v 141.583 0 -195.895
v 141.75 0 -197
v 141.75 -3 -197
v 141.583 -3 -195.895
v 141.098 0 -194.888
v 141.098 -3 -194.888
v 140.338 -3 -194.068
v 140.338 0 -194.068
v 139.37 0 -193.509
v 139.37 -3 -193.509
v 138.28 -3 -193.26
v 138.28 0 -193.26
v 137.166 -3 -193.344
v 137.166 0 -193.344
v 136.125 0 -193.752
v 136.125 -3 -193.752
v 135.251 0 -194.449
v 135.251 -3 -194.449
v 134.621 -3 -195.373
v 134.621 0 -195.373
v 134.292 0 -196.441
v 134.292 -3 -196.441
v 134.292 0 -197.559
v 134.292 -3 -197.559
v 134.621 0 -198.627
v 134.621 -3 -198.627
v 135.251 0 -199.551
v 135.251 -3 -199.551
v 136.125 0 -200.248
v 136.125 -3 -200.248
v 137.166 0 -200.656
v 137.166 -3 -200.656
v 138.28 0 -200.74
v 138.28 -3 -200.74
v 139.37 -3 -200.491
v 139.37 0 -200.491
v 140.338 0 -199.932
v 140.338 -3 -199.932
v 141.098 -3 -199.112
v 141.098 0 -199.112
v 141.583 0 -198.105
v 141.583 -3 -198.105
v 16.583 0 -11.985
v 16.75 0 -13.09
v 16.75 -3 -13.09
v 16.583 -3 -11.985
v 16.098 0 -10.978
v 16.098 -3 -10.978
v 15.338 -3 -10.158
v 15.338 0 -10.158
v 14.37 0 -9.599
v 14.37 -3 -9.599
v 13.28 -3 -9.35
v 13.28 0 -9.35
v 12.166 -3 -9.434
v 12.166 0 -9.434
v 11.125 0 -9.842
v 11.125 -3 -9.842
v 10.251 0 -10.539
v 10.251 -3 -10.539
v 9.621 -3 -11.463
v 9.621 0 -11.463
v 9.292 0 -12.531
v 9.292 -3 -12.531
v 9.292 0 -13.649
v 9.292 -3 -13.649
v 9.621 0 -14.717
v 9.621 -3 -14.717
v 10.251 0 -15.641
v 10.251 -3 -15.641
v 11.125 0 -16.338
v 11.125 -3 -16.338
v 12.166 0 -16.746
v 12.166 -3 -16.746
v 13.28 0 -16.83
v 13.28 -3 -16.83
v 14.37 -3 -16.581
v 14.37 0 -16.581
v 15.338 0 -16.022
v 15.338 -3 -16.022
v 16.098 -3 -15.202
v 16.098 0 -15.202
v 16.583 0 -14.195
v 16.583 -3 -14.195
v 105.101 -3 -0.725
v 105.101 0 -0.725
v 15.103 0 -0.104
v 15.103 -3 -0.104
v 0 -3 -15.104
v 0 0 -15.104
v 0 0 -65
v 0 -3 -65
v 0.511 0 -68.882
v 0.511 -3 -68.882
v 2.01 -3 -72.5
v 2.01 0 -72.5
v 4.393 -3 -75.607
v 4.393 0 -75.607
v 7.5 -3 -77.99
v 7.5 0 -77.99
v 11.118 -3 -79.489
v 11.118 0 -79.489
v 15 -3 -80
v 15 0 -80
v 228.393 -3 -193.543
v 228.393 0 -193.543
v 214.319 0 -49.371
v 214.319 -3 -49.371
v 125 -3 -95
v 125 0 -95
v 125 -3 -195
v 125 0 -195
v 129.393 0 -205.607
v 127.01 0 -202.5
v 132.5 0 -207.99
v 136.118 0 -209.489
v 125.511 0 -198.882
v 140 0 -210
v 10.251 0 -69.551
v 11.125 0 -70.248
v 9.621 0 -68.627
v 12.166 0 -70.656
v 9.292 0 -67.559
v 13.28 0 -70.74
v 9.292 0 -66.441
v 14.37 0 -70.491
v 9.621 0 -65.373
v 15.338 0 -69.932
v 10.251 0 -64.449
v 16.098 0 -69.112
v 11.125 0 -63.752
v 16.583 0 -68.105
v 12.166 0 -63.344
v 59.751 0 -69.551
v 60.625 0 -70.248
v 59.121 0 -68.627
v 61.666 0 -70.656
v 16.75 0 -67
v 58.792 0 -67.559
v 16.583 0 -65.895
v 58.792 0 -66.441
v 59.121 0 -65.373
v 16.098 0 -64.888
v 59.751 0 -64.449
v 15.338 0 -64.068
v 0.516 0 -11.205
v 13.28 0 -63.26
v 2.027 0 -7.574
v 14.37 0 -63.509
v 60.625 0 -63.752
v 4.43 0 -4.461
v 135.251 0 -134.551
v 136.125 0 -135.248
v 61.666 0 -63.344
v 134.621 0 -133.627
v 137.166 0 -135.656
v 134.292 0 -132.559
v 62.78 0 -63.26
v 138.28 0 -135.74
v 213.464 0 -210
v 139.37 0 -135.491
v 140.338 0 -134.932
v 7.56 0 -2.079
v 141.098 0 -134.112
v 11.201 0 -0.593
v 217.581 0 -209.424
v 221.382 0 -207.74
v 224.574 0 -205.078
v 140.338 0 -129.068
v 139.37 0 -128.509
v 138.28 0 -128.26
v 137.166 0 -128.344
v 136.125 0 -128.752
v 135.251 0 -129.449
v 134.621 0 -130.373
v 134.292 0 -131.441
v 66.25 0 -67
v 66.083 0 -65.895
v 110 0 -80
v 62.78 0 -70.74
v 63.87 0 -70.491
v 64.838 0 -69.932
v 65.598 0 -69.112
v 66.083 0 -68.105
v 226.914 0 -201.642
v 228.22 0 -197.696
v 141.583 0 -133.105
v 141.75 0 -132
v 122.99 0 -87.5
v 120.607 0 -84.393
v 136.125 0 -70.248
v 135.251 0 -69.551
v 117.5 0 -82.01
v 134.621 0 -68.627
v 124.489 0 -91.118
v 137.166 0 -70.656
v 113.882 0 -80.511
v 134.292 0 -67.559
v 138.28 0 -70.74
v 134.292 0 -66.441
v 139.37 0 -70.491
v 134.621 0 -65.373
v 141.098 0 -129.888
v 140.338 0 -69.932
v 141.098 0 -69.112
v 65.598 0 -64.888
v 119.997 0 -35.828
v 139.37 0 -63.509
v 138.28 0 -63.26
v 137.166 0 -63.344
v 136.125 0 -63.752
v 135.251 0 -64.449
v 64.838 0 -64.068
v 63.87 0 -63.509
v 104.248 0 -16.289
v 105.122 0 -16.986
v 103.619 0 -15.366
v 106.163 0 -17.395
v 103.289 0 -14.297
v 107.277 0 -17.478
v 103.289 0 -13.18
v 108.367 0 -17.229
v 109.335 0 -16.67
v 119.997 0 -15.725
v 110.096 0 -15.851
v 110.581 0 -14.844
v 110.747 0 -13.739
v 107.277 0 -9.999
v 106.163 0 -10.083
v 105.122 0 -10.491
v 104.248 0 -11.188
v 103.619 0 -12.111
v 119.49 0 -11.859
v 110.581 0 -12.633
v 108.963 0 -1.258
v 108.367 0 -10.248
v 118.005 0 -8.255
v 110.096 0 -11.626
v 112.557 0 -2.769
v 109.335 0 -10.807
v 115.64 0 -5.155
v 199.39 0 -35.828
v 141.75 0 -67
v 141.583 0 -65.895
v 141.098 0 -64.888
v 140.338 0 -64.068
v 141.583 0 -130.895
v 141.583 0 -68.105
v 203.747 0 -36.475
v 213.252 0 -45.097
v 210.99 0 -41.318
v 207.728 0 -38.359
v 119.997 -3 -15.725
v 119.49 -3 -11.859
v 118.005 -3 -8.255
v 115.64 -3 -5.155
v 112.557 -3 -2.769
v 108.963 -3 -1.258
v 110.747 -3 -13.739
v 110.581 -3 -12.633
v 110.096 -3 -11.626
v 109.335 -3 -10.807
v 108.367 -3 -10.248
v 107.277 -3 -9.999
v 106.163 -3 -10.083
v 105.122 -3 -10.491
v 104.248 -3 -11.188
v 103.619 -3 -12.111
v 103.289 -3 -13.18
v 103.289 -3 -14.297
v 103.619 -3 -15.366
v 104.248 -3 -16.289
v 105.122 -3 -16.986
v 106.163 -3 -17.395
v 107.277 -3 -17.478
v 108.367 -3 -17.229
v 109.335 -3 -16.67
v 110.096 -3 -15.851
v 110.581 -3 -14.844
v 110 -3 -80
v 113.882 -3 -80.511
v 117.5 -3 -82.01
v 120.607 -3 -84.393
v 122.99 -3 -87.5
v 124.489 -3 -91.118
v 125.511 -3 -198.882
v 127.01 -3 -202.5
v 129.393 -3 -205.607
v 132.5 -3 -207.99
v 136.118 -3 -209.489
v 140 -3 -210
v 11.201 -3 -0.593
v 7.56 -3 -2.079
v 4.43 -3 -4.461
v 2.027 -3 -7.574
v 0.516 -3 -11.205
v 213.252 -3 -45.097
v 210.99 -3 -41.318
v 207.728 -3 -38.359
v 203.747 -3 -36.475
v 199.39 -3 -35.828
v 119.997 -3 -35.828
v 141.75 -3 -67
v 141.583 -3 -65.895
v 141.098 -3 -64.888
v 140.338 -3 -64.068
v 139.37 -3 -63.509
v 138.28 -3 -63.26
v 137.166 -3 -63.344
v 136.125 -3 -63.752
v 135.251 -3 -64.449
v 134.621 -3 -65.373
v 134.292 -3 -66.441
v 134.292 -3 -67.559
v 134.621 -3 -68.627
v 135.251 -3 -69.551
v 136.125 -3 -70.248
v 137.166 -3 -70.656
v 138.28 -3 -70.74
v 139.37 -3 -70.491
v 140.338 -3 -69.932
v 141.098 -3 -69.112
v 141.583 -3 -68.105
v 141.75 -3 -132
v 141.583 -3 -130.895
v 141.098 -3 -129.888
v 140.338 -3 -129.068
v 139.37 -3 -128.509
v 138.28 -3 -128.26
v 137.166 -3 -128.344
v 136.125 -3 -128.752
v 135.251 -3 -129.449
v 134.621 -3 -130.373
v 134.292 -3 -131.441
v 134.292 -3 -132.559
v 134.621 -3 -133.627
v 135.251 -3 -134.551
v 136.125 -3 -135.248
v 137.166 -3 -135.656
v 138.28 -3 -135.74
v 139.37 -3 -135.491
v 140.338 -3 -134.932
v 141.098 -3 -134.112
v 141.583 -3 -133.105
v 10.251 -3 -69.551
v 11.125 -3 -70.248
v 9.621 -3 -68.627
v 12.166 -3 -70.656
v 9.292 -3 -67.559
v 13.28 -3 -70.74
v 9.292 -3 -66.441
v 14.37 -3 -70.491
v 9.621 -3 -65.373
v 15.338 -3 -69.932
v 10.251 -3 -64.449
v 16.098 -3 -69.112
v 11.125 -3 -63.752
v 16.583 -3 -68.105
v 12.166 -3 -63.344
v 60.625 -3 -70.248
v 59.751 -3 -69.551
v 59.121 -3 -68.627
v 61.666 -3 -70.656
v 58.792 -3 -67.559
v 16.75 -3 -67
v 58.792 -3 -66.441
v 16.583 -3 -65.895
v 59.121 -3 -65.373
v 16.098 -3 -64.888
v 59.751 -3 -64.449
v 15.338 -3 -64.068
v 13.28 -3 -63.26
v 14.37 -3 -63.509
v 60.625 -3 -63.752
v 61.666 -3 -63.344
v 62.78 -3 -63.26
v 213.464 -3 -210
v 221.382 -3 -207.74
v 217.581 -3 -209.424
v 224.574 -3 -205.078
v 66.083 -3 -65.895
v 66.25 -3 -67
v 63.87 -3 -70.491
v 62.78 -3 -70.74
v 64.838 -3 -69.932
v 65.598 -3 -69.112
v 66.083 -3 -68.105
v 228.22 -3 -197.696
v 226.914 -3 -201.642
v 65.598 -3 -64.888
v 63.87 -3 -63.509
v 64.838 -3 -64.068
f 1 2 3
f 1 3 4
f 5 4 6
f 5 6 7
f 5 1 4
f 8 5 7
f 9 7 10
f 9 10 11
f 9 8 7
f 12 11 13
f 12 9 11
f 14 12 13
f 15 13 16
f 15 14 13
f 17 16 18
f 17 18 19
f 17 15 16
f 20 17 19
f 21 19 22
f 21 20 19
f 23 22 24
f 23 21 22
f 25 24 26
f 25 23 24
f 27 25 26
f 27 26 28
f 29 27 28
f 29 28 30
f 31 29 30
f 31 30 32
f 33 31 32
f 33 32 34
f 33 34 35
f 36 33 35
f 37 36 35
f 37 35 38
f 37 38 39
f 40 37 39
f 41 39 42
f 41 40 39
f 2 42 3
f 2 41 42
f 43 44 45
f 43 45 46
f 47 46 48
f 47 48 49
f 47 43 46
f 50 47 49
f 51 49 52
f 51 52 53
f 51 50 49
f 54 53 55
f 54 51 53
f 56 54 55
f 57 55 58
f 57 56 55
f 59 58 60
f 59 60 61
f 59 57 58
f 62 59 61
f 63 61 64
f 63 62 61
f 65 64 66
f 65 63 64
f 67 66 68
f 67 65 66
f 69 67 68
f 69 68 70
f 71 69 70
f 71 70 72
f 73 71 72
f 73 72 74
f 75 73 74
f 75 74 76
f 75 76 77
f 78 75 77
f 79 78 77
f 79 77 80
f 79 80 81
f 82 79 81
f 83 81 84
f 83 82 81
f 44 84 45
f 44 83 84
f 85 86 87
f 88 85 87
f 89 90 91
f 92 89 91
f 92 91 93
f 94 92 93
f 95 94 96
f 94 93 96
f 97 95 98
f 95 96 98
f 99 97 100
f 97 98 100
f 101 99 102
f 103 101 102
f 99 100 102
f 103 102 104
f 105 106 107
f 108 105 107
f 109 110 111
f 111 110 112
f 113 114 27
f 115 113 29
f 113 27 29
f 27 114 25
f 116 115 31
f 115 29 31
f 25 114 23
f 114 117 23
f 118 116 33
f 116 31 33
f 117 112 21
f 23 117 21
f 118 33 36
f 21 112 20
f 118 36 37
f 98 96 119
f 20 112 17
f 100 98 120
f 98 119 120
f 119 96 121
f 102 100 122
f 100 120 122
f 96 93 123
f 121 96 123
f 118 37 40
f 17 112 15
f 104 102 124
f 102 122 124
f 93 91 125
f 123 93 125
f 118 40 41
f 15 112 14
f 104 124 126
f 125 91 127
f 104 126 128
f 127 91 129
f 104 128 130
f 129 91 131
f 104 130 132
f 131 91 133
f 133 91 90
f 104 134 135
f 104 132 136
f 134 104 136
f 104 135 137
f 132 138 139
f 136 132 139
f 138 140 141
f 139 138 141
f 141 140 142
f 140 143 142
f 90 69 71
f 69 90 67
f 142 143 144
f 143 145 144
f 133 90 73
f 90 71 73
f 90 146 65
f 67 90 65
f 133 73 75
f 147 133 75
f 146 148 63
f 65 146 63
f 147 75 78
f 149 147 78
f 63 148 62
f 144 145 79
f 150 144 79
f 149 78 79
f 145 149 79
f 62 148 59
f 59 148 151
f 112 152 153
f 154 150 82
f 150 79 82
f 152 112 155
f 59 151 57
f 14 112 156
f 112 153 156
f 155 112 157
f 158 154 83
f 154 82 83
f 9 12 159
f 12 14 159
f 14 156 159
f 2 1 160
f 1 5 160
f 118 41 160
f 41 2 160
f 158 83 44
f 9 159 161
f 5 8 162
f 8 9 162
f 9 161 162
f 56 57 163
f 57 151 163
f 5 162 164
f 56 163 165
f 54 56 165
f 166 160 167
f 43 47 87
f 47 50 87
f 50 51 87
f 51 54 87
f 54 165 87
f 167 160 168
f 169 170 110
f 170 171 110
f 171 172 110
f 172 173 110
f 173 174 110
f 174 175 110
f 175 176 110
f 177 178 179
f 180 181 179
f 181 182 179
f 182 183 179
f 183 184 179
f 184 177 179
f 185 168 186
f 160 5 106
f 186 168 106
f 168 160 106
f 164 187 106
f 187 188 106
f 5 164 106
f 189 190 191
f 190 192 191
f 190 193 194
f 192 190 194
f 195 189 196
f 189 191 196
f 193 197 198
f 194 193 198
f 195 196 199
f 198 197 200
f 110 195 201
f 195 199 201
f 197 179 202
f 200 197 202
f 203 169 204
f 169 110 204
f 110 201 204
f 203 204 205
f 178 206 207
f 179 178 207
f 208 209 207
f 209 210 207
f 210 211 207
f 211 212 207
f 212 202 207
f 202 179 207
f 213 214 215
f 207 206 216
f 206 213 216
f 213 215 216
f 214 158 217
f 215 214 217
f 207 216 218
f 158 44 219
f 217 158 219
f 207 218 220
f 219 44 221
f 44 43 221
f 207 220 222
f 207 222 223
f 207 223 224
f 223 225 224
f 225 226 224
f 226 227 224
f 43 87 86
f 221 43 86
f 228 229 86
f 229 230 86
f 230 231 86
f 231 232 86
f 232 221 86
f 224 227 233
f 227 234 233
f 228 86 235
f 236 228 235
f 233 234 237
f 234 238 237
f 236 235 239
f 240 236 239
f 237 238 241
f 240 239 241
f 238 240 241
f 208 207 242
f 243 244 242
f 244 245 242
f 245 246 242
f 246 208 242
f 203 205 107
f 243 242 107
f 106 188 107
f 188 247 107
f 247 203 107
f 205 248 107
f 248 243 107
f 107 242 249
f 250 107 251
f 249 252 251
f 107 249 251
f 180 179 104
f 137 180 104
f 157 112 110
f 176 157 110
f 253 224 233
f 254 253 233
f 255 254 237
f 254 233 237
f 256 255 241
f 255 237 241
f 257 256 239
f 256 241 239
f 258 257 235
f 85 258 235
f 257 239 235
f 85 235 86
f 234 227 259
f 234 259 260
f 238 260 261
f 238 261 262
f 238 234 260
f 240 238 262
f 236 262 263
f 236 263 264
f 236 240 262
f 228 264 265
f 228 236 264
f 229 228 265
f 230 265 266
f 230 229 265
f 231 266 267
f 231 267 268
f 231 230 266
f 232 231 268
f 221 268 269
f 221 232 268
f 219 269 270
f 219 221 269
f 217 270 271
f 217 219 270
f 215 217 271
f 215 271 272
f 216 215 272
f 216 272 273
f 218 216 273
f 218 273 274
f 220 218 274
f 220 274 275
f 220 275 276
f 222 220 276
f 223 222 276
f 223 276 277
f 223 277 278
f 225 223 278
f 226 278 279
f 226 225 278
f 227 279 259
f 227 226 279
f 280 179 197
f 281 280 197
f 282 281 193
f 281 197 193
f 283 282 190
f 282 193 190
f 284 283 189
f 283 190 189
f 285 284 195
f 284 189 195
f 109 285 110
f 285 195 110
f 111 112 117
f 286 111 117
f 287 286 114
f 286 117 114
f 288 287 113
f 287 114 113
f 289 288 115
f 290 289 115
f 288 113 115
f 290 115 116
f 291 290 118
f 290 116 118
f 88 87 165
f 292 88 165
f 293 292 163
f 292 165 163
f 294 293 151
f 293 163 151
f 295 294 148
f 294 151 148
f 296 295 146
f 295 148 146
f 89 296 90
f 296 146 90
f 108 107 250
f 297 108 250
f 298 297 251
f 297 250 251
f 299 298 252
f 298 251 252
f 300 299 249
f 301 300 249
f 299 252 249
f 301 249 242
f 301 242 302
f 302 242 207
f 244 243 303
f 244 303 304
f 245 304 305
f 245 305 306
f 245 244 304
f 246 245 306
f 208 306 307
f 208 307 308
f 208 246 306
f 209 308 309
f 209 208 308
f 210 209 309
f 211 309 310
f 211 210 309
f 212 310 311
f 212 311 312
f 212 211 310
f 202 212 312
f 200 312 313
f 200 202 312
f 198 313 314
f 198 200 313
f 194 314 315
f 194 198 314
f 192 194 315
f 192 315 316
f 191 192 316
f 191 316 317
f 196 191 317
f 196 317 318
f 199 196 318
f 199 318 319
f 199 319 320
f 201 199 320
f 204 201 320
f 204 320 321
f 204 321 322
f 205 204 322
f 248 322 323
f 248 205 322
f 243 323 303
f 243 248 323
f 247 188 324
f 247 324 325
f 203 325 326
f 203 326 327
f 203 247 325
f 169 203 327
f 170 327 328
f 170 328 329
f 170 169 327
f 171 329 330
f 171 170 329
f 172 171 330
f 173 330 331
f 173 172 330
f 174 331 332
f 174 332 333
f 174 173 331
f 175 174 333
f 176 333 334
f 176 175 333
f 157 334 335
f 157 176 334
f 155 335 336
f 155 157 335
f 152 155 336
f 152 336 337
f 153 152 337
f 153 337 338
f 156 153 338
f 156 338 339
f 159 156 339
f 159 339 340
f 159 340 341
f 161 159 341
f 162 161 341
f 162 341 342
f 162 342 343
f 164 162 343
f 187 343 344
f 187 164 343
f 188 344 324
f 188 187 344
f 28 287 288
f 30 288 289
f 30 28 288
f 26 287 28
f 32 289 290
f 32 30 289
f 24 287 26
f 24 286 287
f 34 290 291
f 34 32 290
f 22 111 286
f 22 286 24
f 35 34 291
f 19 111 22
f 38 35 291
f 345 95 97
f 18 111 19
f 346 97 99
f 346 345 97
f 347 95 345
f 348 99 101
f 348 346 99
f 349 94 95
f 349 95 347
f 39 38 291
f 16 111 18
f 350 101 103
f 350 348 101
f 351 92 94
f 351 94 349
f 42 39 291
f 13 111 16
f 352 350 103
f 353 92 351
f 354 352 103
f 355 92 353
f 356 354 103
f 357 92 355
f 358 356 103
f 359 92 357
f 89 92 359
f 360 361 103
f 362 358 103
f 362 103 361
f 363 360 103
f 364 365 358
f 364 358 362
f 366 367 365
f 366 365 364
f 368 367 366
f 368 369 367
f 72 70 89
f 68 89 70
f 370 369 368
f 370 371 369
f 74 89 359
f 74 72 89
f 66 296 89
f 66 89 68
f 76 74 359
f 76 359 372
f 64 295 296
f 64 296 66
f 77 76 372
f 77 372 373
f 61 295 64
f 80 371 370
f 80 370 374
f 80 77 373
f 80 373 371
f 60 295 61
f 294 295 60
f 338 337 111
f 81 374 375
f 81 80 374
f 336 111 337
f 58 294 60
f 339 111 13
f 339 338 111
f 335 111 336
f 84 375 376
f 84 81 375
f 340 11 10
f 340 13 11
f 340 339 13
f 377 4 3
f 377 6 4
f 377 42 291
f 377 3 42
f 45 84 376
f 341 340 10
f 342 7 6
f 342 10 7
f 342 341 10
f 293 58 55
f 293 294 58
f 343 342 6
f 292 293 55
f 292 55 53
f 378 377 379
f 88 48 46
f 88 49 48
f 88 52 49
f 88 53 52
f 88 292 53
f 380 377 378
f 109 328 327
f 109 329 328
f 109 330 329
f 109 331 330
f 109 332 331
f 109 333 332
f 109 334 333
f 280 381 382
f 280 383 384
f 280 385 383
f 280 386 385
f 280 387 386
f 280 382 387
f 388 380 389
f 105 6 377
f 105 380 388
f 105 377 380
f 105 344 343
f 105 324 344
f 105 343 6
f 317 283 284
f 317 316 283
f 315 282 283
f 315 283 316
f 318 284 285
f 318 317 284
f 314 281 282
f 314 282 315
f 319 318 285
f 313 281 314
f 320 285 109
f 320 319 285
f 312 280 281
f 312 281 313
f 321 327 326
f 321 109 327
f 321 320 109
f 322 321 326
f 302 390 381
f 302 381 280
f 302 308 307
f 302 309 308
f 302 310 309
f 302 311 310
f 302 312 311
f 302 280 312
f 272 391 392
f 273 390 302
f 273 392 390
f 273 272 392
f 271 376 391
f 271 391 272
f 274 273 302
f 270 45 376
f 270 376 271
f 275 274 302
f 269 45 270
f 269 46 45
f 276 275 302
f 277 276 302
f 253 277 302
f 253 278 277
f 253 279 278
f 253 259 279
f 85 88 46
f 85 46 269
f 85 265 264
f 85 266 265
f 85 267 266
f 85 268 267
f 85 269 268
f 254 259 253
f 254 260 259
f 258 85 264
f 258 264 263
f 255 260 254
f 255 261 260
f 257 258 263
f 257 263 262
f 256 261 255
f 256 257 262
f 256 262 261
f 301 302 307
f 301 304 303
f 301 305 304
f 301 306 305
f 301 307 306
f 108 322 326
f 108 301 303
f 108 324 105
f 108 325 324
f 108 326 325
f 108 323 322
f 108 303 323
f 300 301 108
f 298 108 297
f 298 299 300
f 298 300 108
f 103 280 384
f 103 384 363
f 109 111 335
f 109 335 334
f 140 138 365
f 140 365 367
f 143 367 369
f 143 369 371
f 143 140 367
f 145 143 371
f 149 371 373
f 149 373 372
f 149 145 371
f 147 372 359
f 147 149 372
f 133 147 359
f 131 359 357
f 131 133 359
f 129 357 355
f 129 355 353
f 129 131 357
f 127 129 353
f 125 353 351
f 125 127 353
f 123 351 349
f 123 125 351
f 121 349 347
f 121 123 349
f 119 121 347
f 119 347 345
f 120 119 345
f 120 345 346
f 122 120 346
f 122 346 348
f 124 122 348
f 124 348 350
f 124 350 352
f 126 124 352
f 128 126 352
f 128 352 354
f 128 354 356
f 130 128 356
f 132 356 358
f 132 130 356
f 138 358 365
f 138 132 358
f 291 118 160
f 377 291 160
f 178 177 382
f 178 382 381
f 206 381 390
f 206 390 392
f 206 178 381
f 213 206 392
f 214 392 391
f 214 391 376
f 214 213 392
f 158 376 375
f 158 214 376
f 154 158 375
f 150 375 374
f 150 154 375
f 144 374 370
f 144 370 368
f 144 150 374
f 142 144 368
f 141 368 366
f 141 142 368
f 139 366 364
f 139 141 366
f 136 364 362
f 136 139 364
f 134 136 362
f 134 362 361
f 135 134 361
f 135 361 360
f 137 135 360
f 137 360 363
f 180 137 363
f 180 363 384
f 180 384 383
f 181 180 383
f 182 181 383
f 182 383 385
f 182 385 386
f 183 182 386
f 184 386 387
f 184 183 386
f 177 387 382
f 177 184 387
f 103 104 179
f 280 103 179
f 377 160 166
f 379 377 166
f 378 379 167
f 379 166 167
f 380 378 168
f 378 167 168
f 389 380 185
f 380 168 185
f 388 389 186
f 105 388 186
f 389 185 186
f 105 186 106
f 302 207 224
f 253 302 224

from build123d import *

# Parameters (mm, degrees)
F0_R     = 3.75
F1_DEPTH = 3


with BuildPart() as f1:
    # F0 (on Front) → F1 (new body)
    with BuildSketch(Plane.XZ):
        with BuildLine():
            ThreePointArc((15.103494, -0.10421), (4.430052, -4.460724), (0, -15.103853))
            Line((0, -15.103853), (0, -65))
            ThreePointArc((0, -65), (4.393398, -75.606602), (15, -80))
            Line((15, -80), (110, -80))
            ThreePointArc((110, -80), (120.606602, -84.393398), (125, -95))
            Line((125, -95), (125, -195))
            ThreePointArc((125, -195), (129.393398, -205.606602), (140, -210))
            Line((140, -210), (213.46438, -210))
            ThreePointArc((213.46438, -210), (224.574304, -205.078174), (228.393413, -193.542612))
            Line((228.393413, -193.542612), (214.319188, -49.370563))
            ThreePointArc((214.319188, -49.370563), (209.468329, -39.718027), (199.390155, -35.82795))
            Line((199.390155, -35.82795), (119.997144, -35.82795))
            Line((119.997144, -35.82795), (119.997144, -15.724811))
            ThreePointArc((119.997144, -15.724811), (115.640273, -5.154863), (105.100638, -0.725168))
            Line((105.100638, -0.725168), (15.103494, -0.10421))
        make_face()
        with Locations((138, -197)):
            Circle(F0_R, mode=Mode.SUBTRACT)
        with Locations((138, -132)):
            Circle(F0_R, mode=Mode.SUBTRACT)
        with Locations((13, -67)):
            Circle(F0_R, mode=Mode.SUBTRACT)
        with Locations((62.5, -67)):
            Circle(F0_R, mode=Mode.SUBTRACT)
        with Locations((13, -13.090006)):
            Circle(F0_R, mode=Mode.SUBTRACT)
        with Locations((106.997144, -13.738563)):
            Circle(F0_R, mode=Mode.SUBTRACT)
        with Locations((138, -67)):
            Circle(F0_R, mode=Mode.SUBTRACT)
    extrude(amount=F1_DEPTH)


solid = f1.part
